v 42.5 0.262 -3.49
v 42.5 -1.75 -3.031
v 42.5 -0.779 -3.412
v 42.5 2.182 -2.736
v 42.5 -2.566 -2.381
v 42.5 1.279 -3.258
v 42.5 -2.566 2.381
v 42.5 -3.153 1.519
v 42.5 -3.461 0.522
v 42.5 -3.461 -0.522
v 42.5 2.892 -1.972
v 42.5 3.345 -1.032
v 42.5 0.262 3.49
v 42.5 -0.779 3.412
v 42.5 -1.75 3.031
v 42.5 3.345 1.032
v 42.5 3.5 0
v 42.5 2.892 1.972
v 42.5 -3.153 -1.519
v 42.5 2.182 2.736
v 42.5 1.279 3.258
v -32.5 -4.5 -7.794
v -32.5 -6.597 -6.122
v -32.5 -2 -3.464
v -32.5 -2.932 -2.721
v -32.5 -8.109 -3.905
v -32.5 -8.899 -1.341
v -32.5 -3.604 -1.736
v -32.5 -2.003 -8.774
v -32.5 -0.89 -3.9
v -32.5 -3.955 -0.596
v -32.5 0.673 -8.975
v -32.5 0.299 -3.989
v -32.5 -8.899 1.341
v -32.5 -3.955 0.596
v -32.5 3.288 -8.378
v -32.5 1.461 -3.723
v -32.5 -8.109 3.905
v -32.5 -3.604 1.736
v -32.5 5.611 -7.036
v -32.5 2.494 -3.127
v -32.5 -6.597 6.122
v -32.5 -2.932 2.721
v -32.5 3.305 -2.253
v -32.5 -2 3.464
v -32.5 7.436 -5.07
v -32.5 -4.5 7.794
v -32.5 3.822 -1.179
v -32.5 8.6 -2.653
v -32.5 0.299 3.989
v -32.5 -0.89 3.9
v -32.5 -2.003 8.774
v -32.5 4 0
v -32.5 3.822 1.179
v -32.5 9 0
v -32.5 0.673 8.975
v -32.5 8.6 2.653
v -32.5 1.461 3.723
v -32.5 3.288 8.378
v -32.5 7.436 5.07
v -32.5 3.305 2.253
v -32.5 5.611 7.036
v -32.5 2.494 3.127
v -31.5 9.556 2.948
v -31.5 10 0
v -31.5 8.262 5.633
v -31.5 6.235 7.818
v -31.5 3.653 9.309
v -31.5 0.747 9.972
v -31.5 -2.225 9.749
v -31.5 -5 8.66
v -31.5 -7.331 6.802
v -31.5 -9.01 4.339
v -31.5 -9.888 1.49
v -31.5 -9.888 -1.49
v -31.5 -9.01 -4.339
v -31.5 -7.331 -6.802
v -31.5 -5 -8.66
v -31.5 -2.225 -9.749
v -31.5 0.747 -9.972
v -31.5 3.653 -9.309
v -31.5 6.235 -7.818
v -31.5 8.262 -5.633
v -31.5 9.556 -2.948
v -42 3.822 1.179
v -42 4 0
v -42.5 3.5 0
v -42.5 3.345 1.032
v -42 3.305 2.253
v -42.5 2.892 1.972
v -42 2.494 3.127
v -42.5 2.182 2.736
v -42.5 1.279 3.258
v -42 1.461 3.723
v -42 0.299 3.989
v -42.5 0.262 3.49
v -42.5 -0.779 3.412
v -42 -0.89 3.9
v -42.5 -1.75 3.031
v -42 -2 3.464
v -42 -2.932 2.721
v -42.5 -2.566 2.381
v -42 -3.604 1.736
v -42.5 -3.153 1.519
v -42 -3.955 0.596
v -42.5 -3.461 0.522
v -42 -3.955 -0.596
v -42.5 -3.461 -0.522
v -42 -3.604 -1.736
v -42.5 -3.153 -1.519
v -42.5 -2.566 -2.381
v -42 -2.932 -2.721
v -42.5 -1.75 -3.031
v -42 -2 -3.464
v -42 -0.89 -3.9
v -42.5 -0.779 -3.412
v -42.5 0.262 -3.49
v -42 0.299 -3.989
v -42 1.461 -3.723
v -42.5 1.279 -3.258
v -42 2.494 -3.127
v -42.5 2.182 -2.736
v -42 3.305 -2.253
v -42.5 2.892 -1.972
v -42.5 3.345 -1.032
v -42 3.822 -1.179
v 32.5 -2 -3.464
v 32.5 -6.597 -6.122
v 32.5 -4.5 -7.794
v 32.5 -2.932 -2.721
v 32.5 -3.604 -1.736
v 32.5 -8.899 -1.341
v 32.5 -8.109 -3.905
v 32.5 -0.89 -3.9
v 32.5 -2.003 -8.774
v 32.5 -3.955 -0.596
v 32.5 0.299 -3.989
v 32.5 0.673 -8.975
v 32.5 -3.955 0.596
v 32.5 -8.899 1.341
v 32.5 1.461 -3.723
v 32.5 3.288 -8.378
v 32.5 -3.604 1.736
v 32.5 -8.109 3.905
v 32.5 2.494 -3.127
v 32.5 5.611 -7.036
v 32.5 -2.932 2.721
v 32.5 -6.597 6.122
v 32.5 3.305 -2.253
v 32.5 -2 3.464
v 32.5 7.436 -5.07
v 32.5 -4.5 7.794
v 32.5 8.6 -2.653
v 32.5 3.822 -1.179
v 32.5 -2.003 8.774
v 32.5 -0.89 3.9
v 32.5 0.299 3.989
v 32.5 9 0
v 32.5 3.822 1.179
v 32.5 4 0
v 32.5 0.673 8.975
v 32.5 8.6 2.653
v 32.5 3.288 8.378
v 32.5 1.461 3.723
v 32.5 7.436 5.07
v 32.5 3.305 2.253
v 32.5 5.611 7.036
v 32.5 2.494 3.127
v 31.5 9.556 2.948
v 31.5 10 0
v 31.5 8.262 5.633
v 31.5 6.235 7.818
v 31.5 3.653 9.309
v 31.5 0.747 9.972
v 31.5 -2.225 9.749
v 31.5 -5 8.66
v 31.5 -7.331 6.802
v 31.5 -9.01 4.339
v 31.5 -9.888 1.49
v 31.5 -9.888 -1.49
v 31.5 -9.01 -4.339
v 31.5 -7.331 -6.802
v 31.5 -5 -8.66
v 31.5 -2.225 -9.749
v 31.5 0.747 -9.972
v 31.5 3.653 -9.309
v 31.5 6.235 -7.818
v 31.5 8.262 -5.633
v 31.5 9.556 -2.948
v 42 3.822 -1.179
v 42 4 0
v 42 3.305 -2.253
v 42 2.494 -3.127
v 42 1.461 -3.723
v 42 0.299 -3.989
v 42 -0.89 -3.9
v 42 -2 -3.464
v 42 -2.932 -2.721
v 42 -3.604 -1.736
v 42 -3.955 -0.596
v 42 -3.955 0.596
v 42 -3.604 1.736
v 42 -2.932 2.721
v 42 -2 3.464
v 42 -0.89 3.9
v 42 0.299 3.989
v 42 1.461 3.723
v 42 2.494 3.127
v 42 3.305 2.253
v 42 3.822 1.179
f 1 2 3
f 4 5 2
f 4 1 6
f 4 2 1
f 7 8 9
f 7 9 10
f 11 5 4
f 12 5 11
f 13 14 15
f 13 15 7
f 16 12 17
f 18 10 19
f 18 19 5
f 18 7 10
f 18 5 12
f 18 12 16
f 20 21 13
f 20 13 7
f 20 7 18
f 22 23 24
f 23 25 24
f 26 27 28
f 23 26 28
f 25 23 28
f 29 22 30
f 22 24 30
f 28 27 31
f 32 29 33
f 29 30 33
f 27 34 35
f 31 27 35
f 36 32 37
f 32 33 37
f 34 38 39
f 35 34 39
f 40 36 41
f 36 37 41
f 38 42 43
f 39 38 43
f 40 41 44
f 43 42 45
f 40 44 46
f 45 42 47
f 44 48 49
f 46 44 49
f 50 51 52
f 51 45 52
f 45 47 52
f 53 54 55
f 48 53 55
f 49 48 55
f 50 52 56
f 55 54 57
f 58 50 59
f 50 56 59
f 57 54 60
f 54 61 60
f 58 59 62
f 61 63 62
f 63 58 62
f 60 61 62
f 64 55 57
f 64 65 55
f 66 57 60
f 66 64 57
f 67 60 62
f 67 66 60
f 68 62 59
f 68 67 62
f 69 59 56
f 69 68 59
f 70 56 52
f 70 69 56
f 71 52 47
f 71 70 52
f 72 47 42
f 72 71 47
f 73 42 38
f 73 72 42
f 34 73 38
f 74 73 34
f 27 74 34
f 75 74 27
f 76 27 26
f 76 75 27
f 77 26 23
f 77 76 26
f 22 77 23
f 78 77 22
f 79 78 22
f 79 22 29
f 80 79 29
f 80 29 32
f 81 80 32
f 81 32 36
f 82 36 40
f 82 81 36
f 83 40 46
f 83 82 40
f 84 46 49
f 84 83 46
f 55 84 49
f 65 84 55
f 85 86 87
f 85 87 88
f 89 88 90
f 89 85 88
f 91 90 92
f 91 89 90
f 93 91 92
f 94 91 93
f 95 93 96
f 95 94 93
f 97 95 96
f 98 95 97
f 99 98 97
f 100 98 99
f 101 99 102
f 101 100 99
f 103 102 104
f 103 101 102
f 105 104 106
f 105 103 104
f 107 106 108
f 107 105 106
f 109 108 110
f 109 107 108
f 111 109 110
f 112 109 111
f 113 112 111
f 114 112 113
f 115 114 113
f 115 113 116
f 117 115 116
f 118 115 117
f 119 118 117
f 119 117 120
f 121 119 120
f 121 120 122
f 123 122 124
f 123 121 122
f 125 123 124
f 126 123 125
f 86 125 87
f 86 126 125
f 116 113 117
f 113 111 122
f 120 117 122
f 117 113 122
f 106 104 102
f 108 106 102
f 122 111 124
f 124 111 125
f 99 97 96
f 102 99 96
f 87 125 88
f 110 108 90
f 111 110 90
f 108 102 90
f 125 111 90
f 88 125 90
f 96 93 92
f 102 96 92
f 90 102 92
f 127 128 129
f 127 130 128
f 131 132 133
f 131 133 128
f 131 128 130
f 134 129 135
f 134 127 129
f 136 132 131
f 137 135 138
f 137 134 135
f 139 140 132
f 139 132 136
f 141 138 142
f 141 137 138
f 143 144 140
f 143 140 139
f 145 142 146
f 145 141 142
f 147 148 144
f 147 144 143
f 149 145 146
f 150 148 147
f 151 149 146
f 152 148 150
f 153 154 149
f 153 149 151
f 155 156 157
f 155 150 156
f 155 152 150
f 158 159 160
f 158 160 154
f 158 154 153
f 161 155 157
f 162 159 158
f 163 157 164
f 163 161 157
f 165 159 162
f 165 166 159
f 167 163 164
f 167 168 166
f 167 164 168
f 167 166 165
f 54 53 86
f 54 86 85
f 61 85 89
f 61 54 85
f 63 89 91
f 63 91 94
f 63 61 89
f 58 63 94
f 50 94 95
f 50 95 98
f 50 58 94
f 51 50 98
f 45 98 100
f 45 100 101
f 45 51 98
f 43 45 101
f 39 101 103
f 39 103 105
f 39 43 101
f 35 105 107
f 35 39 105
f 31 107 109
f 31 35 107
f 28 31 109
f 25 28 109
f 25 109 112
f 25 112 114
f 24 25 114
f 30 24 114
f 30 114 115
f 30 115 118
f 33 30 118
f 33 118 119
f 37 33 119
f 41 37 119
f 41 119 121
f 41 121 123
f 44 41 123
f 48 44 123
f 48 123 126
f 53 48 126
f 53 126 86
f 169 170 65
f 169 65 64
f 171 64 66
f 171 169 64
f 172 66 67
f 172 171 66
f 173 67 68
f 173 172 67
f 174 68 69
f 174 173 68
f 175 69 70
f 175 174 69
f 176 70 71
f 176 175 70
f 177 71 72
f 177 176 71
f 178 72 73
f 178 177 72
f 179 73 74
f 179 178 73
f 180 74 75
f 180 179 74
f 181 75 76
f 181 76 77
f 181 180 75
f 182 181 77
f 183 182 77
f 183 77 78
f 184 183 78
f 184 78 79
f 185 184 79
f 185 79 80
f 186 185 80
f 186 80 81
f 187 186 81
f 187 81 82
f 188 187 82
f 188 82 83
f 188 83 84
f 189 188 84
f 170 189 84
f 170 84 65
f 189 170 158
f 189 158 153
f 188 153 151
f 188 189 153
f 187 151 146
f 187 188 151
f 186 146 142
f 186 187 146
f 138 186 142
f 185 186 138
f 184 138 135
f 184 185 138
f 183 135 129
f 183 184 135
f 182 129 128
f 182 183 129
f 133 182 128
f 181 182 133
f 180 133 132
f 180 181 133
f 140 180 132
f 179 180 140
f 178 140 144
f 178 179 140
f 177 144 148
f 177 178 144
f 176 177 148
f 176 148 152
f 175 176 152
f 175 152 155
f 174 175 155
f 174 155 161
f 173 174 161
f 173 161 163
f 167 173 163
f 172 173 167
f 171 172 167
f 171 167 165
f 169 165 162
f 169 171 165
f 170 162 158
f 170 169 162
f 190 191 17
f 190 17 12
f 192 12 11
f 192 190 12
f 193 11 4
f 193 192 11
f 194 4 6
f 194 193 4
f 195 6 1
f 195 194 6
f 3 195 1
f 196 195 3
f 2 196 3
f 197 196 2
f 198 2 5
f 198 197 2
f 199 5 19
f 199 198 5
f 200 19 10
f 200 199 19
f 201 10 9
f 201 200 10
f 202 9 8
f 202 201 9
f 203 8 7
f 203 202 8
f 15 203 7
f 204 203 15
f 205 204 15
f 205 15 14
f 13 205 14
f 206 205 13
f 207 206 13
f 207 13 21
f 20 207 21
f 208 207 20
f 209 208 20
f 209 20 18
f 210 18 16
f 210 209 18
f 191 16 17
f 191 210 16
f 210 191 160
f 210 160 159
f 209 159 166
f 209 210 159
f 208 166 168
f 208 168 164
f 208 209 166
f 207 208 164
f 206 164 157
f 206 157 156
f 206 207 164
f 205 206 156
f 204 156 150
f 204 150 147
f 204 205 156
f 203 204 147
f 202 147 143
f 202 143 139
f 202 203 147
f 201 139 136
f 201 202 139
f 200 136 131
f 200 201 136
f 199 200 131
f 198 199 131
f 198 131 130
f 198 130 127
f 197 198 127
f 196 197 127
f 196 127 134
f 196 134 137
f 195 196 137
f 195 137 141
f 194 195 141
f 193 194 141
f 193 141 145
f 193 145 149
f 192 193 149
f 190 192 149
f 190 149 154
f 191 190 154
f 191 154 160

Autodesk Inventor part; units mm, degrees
ref_plane "YZ Plane" through (0, 0, 0) normal (1, 0, 0) x (0, 1, 0)
ref_plane "XZ Plane" through (0, 0, 0) normal (0, 1, 0) x (-1, 0, 0)
ref_plane "XY Plane" through (0, 0, 0) normal (0, 0, 1) x (1, 0, 0)
sketch "Schizzo1" plane through (0, 0, 0) normal (0, 0, 1) x (1, 0, 0)
  line L0 (-42.5, 0) -> (42.5, 0)
  line L1 (-42.5, 0) -> (-42.5, 4)
  line L2 (-42.5, 4) -> (-32.5, 4)
  line L3 (-32.5, 4) -> (-32.5, 10)
  line L4 (-32.5, 10) -> (32.5, 10)
  line L5 (32.5, 10) -> (32.5, 4)
  line L6 (32.5, 4) -> (42.5, 4)
  line L7 (42.5, 4) -> (42.5, 0)
  point P0 (0, 0)
  point P1 (0, 0)
  point P2 (0, 10)
  dimension "d0" = 8
  dimension "d1" = 10
  dimension "d2" = 20
  dimension "d3" = 65
  dimension "d4" = 10
revolve "Rivoluzione1" add sketch "Schizzo1" angle 360 about axis through (-42.5, 0, 0) along (1, 0, 0)
chamfer "Smusso1" distance 0.5 angle 45 2 edges at (-42.5, -4, 0) (42.5, -4, 0)
thread "Filettatura1" size "M8x1.25" class "6g" standard "ISO Metric profile" full length
chamfer "Smusso2" distance 1 angle 45 2 edges at (-32.5, -10, 0) (32.5, -10, 0)
properties part number "Albero cuscinetto"
